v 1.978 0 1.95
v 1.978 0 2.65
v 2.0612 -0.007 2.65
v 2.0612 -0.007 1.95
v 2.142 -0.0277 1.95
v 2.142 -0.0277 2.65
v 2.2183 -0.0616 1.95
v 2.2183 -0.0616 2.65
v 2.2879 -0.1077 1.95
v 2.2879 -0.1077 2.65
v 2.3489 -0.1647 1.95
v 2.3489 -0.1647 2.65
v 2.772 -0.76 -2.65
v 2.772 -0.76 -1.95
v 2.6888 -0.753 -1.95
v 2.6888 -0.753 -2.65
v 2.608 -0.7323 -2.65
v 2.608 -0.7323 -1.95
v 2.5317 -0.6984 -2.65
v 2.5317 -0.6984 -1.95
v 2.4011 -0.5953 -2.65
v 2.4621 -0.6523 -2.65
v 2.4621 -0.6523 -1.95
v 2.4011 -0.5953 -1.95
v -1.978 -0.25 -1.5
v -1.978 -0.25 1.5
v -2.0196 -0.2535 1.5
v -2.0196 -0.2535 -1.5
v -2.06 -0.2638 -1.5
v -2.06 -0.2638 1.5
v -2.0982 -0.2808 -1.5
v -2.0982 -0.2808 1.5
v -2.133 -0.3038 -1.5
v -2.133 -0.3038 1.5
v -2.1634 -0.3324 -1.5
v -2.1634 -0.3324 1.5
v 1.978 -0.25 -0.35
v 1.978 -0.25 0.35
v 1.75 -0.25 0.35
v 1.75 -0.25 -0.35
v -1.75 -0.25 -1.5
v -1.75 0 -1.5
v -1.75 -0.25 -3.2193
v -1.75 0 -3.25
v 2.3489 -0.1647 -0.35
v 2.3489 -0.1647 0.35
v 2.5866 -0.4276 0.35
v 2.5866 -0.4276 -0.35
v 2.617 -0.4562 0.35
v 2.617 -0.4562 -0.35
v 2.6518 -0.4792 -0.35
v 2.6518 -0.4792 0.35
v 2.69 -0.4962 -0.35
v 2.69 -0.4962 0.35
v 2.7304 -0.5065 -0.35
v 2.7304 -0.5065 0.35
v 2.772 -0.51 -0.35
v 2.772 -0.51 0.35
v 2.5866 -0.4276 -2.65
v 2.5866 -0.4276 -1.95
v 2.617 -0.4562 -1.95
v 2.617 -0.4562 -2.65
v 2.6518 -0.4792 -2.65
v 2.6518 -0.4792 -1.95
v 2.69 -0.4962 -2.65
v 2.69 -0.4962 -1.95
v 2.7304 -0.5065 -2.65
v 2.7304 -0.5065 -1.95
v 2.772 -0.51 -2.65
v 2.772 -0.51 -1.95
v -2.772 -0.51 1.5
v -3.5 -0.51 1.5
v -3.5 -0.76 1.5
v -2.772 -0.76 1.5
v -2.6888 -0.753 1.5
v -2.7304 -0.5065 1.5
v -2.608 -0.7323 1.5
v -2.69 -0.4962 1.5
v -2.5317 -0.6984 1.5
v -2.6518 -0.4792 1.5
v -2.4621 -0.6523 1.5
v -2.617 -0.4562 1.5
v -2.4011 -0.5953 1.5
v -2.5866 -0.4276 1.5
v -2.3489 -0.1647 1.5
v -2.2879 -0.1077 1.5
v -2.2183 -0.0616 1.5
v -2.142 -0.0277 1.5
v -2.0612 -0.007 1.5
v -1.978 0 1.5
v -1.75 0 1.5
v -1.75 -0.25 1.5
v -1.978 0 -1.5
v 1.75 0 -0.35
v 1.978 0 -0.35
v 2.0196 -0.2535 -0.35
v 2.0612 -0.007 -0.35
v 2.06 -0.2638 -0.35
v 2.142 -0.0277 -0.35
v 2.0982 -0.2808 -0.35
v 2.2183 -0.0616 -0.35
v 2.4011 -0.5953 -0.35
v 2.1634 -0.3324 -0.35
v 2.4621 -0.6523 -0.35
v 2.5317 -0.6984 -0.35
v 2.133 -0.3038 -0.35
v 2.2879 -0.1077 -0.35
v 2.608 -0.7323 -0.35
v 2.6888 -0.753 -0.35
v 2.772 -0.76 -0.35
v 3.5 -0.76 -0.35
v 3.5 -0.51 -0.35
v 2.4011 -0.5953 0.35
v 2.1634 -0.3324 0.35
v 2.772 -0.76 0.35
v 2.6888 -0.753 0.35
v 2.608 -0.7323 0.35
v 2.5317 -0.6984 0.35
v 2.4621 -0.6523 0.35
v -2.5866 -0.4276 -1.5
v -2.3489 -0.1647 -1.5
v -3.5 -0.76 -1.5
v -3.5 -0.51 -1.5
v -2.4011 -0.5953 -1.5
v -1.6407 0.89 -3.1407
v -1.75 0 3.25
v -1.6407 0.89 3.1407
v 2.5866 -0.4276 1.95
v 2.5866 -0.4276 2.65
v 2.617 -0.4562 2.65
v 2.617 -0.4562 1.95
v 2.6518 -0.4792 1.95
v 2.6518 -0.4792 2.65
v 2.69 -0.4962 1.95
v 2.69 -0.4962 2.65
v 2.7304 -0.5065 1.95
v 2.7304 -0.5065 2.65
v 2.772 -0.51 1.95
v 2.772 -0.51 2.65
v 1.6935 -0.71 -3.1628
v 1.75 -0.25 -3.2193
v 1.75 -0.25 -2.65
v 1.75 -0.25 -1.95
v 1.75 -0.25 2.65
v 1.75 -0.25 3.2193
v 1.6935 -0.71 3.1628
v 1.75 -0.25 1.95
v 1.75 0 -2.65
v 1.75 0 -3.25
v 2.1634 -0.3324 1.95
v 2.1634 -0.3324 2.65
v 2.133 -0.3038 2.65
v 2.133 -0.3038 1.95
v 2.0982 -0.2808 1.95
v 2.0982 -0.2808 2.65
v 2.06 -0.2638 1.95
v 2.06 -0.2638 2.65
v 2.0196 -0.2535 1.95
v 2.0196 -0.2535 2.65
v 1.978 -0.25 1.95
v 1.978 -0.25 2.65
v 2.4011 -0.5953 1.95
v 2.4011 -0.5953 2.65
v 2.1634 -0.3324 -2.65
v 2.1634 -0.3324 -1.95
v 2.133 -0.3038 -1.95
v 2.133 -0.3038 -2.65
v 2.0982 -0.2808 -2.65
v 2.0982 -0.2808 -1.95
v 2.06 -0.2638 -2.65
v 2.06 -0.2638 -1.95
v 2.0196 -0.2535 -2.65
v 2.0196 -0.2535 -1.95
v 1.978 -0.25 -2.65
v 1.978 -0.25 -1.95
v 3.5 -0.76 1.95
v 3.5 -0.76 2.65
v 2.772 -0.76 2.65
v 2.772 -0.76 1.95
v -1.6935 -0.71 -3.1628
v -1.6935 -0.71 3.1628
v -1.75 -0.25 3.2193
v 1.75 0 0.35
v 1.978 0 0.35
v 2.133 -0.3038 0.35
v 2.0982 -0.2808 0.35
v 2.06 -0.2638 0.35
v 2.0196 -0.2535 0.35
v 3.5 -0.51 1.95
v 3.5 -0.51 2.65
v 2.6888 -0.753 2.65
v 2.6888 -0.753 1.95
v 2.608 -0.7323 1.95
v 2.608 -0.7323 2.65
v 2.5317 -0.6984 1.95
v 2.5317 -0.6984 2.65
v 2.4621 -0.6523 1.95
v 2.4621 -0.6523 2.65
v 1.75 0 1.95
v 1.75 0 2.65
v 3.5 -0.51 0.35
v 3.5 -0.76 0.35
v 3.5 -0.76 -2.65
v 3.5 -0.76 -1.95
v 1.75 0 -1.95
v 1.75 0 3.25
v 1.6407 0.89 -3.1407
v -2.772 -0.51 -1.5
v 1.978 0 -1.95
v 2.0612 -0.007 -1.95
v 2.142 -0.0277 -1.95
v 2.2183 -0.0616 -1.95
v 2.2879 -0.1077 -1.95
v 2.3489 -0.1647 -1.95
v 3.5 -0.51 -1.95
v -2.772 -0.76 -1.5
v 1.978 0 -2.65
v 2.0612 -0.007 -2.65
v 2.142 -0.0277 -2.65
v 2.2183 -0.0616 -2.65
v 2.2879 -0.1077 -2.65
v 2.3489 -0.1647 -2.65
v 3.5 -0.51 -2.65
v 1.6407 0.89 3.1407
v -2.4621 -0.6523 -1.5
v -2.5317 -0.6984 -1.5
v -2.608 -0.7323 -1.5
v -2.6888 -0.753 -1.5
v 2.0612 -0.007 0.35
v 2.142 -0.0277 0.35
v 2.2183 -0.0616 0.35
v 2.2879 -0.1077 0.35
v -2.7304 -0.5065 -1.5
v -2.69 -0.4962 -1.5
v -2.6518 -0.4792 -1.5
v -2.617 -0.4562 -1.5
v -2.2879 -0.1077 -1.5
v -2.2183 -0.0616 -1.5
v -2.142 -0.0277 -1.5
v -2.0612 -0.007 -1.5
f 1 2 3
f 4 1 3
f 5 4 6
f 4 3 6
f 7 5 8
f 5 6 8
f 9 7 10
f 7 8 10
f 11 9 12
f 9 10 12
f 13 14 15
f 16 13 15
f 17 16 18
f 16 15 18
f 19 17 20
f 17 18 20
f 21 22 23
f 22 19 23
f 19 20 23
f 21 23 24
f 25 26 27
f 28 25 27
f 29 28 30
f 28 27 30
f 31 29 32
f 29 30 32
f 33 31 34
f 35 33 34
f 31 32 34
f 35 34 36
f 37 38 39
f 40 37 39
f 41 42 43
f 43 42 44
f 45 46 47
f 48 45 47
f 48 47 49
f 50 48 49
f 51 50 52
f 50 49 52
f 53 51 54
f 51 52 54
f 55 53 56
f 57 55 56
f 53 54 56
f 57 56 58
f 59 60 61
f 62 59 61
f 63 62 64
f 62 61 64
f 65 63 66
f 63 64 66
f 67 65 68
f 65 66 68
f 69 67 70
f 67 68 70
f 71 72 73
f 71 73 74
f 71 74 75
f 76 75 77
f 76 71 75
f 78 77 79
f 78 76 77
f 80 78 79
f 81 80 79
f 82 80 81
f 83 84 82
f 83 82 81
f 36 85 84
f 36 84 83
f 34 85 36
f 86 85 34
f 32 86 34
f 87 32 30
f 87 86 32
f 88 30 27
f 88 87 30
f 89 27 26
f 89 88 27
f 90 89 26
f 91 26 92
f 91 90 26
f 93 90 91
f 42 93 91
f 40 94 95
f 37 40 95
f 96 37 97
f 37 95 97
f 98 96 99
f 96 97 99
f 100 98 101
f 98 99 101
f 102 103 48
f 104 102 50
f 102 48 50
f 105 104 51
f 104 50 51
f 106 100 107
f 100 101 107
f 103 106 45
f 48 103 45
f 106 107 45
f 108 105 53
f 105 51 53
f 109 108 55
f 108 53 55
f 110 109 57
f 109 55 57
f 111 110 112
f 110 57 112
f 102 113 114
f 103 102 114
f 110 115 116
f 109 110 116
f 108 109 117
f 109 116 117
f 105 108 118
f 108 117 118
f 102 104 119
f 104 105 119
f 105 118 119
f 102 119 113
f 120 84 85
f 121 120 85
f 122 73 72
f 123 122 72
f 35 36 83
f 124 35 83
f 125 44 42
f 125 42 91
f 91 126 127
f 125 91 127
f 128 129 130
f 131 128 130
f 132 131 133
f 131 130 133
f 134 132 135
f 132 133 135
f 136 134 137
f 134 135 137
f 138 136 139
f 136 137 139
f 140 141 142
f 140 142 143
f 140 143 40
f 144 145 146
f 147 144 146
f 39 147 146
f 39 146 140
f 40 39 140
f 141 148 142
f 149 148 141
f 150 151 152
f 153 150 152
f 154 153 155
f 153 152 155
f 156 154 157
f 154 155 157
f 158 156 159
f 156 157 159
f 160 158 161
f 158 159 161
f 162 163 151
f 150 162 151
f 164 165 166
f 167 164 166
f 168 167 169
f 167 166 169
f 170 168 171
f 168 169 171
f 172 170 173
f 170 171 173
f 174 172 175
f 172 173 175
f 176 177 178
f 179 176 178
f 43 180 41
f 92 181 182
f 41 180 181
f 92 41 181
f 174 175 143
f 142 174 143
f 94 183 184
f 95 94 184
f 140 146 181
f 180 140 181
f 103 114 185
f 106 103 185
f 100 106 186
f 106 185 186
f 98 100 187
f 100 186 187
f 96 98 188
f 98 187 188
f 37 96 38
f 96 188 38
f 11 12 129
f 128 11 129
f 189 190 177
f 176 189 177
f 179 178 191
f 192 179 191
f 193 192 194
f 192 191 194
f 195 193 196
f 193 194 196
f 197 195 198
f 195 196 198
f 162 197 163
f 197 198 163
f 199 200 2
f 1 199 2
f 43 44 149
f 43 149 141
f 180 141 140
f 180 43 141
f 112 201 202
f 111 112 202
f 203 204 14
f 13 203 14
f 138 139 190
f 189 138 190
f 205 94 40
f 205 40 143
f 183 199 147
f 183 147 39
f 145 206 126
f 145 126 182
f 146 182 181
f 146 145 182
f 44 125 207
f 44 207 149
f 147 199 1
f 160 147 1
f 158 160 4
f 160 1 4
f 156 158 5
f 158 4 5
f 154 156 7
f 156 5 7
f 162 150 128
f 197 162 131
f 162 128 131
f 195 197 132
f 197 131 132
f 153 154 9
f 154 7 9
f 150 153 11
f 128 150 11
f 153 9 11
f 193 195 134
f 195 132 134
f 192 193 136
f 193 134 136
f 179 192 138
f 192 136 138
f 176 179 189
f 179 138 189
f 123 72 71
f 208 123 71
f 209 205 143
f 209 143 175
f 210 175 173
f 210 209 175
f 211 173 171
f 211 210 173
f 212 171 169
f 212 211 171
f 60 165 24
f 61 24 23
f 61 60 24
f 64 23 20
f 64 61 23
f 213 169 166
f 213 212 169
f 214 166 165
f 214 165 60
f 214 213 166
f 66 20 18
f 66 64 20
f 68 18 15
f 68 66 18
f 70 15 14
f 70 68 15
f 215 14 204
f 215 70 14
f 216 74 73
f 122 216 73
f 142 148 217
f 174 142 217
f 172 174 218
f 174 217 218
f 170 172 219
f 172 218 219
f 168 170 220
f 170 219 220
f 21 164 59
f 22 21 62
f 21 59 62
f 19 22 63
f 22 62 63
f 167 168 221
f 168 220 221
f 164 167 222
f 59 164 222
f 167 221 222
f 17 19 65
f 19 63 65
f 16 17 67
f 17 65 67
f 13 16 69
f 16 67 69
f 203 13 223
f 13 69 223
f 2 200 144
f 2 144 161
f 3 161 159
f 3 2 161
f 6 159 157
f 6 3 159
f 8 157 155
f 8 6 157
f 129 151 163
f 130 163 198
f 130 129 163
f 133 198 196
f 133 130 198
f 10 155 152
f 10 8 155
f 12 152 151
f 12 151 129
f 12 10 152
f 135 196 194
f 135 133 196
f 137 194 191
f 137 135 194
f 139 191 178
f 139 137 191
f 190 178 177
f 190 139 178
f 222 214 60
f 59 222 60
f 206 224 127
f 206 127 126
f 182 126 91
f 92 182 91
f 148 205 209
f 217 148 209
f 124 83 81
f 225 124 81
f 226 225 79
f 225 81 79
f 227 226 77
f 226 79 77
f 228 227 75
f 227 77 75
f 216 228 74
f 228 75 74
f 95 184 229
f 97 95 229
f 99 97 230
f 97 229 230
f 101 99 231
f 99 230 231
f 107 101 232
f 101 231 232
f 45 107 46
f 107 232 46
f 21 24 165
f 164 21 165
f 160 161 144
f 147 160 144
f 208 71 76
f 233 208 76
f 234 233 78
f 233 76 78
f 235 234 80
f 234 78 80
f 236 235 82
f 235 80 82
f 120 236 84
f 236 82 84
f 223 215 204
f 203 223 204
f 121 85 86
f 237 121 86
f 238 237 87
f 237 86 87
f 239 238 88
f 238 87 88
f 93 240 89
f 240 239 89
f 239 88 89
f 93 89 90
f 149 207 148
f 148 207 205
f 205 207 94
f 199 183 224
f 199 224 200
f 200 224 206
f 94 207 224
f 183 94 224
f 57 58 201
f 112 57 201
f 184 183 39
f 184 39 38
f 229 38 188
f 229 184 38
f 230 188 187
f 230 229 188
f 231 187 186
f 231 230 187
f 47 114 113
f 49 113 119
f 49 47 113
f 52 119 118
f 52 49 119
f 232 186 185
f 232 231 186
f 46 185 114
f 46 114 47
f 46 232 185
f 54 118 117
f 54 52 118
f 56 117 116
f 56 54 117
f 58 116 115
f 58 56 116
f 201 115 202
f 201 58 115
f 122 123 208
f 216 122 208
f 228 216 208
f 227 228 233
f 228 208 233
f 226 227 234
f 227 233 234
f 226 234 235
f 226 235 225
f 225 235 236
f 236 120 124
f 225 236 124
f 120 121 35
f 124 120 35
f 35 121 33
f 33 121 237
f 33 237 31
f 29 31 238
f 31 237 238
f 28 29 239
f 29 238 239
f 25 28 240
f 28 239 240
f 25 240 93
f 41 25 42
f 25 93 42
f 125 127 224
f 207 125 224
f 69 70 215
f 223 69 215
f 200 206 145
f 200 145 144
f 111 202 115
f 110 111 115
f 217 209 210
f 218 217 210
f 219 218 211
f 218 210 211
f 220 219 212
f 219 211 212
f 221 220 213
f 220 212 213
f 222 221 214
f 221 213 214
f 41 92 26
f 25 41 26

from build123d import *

# Parameters (mm, degrees)
EXTRUDE1_DEPTH     = 3.25
SKETCH2_W          = 1.75
SKETCH2_H          = 1.75
SKETCH2_H_2        = 1.6
SKETCH2_H_3        = 0.6
CUT_EXTRUDE1_DEPTH = 2.65
CUT_EXTRUDE3_DEPTH = 1.75
CUT_EXTRUDE4_DEPTH = 1.75


with BuildPart() as part:
    # Sketch1 → Extrude1 (new body, symmetric)
    with BuildSketch(Plane.XY):
        with BuildLine():
            Line((-1.640721741, 0.89), (1.640721741, 0.89))
            Line((1.640721741, 0.89), (1.75, 0))
            Line((1.75, 0), (1.977970995, 0))
            ThreePointArc((1.977970995, 0), (2.180892756, -0.043028711), (2.34888867, -0.164708965))
            Line((2.34888867, -0.164708965), (2.586570168, -0.427645517))
            ThreePointArc((2.586570168, -0.427645517), (2.670568125, -0.488485644), (2.772029005, -0.51))
            Line((2.772029005, -0.51), (3.5, -0.51))
            Line((3.5, -0.51), (3.5, -0.76))
            Line((3.5, -0.76), (2.772029005, -0.76))
            ThreePointArc((2.772029005, -0.76), (2.569107244, -0.716971289), (2.40111133, -0.595291035))
            Line((2.40111133, -0.595291035), (2.163429832, -0.332354483))
            ThreePointArc((2.163429832, -0.332354483), (2.079431875, -0.271514356), (1.977970995, -0.25))
            Line((1.977970995, -0.25), (1.75, -0.25))
            Line((1.75, -0.25), (1.693519102, -0.71))
            Line((1.693519102, -0.71), (-1.693519102, -0.71))
            Line((-1.693519102, -0.71), (-1.75, -0.25))
            Line((-1.75, -0.25), (-1.977970995, -0.25))
            ThreePointArc((-1.977970995, -0.25), (-2.079431875, -0.271514356), (-2.163429832, -0.332354483))
            Line((-2.163429832, -0.332354483), (-2.40111133, -0.595291035))
            ThreePointArc((-2.40111133, -0.595291035), (-2.569107244, -0.716971289), (-2.772029005, -0.76))
            Line((-2.772029005, -0.76), (-3.5, -0.76))
            Line((-3.5, -0.76), (-3.5, -0.51))
            Line((-3.5, -0.51), (-2.772029005, -0.51))
            ThreePointArc((-2.772029005, -0.51), (-2.670568125, -0.488485644), (-2.586570168, -0.427645517))
            Line((-2.586570168, -0.427645517), (-2.34888867, -0.164708965))
            ThreePointArc((-2.34888867, -0.164708965), (-2.180892756, -0.043028711), (-1.977970995, 0))
            Line((-1.977970995, 0), (-1.75, 0))
            Line((-1.75, 0), (-1.640721741, 0.89))
        make_face()
    extrude(amount=EXTRUDE1_DEPTH, both=True)

    # Sketch2 → Cut-Extrude1 (cut, through all)
    with BuildSketch(Plane(origin=(0, 0.89, 0), x_dir=(1, 0, 0), z_dir=(0, 1, 0))):
        with Locations((-2.625, 2.375)):
            Rectangle(SKETCH2_W, SKETCH2_H)
        with Locations((-2.625, -2.375)):
            Rectangle(SKETCH2_W, SKETCH2_H)
        with Locations((2.625, 1.15)):
            Rectangle(SKETCH2_W, SKETCH2_H_2)
        with Locations((2.625, -1.15)):
            Rectangle(SKETCH2_W, SKETCH2_H_2)
        with Locations((2.625, 2.95)):
            Rectangle(SKETCH2_W, SKETCH2_H_3)
        with Locations((2.625, -2.95)):
            Rectangle(SKETCH2_W, SKETCH2_H_3)
    extrude(amount=-CUT_EXTRUDE1_DEPTH, mode=Mode.SUBTRACT)

    # Sketch3 → Cut-Extrude3 (cut, symmetric)
    with BuildSketch(Plane(origin=(0, 0, 0), x_dir=(0, 0, -1), z_dir=(1, 0, 0))):
        Polygon((3.140721741, 0.89), (3.25, 0), (3.25, 0.89), align=None)
        Polygon((-3.25, 0), (-3.25, 0.89), (-3.140721741, 0.89), align=None)
    extrude(amount=CUT_EXTRUDE3_DEPTH, both=True, mode=Mode.SUBTRACT)

    # Sketch4 → Cut-Extrude4 (cut, symmetric)
    with BuildSketch(Plane(origin=(0, 0, 0), x_dir=(0, 0, -1), z_dir=(1, 0, 0))):
        Polygon((3.162822962, -0.71), (3.25, -0.71), (3.25, 0), align=None)
        Polygon((-3.25, 0), (-3.162822962, -0.71), (-3.25, -0.71), align=None)
    extrude(amount=CUT_EXTRUDE4_DEPTH, both=True, mode=Mode.SUBTRACT)


solid = part.part
